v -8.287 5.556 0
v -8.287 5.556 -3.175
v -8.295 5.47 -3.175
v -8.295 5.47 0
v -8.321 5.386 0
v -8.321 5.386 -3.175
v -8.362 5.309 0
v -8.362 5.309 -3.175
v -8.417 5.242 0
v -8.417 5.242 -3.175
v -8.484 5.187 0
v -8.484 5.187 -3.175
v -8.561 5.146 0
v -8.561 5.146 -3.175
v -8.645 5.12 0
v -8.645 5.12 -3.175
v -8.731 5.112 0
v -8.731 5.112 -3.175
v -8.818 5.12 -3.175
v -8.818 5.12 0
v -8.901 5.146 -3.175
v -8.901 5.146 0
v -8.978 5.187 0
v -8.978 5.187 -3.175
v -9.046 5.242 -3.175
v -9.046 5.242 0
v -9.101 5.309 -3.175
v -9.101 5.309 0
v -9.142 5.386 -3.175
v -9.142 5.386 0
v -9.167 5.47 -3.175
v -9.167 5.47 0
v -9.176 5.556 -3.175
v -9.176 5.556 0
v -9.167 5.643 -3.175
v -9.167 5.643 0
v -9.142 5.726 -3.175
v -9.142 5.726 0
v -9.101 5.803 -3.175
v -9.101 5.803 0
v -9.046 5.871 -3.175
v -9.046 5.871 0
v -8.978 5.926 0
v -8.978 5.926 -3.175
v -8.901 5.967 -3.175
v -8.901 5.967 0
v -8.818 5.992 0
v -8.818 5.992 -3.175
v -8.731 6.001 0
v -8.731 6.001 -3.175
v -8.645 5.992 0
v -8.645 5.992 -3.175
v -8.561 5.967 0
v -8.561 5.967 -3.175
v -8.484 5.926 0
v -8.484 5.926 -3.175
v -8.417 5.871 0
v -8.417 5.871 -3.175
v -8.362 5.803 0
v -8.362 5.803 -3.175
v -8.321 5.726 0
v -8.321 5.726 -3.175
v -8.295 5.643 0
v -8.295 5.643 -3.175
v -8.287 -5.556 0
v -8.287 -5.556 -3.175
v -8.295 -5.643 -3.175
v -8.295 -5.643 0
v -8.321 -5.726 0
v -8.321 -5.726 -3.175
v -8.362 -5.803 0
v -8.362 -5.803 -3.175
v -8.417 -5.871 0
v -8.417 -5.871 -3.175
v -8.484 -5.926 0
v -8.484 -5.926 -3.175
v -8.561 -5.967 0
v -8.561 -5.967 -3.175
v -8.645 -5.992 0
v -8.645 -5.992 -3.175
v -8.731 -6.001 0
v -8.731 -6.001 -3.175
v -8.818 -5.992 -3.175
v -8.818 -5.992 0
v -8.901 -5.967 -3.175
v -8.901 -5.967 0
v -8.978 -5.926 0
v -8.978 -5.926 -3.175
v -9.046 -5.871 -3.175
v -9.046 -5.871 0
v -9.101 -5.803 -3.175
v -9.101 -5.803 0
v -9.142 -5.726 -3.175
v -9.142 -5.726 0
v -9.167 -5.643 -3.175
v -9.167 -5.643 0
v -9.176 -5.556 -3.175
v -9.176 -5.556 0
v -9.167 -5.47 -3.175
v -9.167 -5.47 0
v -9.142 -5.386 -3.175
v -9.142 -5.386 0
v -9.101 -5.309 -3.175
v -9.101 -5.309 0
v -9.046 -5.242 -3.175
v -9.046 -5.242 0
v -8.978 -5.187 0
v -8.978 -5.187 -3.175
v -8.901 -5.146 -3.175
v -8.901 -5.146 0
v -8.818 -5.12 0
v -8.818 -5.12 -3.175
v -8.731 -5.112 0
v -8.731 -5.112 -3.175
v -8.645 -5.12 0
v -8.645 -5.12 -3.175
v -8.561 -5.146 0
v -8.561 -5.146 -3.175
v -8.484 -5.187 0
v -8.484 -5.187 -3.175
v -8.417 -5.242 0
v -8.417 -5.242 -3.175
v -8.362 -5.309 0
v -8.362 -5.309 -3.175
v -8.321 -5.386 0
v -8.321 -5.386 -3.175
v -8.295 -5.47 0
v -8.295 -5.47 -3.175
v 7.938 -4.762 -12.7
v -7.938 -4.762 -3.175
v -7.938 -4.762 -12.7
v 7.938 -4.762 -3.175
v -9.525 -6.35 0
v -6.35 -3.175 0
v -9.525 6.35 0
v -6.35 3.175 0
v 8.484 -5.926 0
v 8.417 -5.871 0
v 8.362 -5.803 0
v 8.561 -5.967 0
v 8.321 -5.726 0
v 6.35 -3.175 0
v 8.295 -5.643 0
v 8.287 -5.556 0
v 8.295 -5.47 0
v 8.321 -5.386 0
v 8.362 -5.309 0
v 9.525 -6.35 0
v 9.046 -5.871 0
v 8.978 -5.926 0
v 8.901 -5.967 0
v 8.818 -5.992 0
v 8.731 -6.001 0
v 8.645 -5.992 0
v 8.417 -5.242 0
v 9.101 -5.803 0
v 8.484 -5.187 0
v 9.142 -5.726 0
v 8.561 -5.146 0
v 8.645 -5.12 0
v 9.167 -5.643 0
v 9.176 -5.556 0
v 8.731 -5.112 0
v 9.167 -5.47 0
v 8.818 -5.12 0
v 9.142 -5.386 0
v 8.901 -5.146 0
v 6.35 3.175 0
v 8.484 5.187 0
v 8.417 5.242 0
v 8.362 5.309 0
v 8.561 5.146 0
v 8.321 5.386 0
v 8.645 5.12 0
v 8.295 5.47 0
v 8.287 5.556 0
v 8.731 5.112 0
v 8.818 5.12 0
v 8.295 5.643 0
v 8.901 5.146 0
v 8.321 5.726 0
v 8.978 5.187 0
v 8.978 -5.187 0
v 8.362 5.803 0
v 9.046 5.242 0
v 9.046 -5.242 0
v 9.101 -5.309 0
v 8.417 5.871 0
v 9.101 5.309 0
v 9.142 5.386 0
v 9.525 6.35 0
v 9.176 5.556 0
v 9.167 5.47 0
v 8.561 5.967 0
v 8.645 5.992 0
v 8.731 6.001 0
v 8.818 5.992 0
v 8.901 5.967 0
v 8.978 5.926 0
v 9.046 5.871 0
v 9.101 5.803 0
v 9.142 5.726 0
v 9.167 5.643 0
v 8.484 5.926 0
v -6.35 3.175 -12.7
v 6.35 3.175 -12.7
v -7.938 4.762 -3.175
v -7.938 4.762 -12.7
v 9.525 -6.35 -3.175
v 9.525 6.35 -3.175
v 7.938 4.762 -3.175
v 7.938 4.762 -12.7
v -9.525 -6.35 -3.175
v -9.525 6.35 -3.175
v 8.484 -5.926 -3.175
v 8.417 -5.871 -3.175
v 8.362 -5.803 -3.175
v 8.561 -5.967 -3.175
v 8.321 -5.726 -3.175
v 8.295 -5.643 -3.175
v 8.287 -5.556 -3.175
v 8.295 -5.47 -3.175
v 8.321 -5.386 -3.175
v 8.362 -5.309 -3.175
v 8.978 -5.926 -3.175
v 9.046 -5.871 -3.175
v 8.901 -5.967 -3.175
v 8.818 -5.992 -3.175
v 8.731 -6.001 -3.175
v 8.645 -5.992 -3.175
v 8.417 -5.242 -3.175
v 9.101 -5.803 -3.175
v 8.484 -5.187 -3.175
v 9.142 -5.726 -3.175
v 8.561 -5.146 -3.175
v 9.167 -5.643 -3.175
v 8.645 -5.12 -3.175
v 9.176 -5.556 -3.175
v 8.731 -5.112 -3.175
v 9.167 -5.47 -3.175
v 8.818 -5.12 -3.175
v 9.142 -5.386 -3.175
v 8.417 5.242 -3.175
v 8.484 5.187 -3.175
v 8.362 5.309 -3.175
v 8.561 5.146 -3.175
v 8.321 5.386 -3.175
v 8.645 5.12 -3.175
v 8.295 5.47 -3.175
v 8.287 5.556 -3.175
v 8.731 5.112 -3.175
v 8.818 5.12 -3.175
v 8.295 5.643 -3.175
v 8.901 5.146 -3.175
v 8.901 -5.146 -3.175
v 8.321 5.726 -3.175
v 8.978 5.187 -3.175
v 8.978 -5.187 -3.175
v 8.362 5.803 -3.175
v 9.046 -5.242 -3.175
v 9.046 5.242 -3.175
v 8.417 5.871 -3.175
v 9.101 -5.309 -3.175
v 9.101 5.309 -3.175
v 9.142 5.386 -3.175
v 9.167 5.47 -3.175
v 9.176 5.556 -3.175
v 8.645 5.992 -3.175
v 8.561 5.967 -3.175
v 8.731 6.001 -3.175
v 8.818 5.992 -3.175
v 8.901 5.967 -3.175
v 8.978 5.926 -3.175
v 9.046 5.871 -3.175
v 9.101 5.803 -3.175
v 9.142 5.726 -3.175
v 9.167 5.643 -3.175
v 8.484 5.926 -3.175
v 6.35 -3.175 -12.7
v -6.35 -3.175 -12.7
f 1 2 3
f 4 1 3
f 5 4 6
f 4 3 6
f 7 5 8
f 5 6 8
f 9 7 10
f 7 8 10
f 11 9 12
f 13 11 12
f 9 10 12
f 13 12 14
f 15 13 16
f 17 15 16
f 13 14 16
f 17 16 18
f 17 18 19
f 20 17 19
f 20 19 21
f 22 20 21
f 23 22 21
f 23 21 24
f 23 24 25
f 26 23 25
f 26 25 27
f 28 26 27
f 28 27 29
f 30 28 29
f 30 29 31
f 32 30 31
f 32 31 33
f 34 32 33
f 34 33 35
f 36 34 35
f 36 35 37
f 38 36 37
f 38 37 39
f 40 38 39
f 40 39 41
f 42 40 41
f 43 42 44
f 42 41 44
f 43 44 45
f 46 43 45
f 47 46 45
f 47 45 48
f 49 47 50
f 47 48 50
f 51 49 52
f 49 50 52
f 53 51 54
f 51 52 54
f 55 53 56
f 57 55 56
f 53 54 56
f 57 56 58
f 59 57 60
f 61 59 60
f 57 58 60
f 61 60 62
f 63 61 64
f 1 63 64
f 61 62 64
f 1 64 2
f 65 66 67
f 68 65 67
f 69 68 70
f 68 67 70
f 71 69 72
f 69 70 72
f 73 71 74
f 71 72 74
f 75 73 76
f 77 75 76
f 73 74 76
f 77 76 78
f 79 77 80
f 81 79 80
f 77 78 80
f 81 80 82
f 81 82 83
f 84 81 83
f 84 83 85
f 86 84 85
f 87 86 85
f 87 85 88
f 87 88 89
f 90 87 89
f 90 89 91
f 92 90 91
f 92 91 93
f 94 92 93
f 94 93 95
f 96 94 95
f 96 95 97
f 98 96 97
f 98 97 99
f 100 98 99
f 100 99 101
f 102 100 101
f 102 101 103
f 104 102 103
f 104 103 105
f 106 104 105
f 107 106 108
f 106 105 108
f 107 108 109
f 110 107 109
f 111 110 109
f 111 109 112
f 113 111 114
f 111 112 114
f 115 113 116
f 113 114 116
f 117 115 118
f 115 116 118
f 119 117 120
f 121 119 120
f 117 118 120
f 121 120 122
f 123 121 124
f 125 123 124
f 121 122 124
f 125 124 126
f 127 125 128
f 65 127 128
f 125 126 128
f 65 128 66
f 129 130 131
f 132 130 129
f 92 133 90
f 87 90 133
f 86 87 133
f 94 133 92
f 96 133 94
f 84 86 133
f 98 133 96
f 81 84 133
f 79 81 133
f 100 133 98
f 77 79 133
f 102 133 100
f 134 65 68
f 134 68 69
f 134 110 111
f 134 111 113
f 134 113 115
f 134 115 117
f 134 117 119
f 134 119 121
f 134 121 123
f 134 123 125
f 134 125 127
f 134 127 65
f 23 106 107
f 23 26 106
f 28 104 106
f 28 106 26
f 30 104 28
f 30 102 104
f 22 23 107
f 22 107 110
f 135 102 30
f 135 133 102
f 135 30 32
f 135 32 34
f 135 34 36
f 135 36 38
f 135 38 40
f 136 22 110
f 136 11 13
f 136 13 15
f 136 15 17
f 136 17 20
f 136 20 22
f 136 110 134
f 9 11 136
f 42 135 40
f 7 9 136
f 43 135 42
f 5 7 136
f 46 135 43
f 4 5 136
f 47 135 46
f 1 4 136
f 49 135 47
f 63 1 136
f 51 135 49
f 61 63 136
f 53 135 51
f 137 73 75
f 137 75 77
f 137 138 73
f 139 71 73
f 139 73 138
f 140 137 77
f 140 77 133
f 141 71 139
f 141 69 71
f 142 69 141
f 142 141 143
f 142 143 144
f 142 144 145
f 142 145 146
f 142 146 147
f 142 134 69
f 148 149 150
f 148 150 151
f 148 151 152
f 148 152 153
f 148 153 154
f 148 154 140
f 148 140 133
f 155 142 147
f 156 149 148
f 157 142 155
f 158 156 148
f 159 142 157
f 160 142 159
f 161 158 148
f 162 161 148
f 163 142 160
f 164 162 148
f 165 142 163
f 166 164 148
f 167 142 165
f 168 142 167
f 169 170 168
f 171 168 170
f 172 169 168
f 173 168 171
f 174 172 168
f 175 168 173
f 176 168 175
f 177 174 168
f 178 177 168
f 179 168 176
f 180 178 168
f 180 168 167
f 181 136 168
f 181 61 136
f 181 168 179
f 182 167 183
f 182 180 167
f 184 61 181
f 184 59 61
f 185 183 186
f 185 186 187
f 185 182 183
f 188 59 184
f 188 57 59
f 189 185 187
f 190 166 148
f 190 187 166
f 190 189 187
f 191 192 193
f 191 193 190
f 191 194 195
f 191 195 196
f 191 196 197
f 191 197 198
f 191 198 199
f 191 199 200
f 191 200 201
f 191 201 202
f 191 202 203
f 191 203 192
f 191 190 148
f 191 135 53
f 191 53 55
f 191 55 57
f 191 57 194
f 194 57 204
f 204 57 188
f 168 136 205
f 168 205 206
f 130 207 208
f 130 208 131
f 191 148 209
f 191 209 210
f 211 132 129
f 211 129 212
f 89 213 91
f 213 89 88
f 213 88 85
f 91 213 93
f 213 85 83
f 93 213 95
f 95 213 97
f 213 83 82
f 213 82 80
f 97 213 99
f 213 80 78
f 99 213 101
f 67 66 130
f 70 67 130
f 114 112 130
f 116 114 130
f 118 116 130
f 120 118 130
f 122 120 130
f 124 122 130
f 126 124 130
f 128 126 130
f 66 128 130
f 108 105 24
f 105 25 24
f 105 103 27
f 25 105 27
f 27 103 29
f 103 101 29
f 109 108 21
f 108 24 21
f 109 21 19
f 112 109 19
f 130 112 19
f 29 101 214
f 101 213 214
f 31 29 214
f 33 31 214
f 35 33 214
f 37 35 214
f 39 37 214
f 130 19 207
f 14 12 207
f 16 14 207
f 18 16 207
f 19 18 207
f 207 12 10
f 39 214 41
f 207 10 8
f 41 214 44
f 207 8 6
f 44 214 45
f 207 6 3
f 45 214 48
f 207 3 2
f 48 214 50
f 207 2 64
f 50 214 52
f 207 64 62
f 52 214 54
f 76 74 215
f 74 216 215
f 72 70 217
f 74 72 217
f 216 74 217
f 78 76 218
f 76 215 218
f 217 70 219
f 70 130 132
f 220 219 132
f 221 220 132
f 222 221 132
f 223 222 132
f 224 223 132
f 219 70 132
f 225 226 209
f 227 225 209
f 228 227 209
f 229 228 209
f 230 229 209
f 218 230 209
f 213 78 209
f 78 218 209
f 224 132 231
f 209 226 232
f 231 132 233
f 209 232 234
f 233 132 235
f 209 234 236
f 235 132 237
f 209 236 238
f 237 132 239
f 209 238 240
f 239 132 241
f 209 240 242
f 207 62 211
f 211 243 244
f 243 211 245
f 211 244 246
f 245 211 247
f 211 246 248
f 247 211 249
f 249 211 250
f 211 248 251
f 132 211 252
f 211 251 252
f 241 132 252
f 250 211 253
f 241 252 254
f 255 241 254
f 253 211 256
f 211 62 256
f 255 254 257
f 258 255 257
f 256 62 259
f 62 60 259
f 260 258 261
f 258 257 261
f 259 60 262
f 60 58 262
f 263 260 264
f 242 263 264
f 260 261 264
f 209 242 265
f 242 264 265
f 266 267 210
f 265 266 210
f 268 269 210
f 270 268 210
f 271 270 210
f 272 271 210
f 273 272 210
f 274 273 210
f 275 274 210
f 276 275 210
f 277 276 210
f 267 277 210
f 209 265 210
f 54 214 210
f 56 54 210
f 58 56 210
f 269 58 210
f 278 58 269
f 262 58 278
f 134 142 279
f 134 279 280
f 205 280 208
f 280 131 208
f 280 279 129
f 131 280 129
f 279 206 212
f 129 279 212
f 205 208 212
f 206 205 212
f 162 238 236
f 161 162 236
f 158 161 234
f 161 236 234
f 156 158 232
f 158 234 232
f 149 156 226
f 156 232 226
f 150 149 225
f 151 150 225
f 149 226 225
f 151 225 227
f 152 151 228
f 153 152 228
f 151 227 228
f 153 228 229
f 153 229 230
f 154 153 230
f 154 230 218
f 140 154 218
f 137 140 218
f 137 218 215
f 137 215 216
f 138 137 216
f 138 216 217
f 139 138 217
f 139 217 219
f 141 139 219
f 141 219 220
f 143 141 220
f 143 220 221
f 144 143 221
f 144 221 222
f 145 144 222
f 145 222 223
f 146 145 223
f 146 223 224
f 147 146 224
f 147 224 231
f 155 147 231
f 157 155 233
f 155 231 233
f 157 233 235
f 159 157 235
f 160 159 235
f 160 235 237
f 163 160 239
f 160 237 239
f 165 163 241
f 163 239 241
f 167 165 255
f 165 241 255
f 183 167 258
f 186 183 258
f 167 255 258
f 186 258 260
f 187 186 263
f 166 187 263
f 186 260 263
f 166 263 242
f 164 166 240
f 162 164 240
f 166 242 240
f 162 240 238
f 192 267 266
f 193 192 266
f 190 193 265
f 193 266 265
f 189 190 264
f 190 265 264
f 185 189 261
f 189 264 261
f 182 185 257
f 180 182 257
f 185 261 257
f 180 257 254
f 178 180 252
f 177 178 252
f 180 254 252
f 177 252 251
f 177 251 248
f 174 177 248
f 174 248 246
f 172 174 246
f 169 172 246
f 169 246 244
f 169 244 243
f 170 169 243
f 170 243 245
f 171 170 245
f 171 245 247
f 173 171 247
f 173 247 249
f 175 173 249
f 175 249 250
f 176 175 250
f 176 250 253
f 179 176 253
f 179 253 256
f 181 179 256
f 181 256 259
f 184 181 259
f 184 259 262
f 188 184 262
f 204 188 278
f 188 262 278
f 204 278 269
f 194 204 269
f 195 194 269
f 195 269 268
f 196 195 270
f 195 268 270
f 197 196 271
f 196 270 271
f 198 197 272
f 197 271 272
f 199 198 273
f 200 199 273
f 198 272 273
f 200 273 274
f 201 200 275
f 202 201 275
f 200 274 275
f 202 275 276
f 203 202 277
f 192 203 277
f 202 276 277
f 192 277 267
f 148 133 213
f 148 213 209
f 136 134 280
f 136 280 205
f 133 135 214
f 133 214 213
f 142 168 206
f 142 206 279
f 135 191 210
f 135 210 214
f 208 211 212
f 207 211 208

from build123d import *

# Parameters (mm, degrees)
F1_DEPTH = 3.175
F2_DEPTH = 12.7
F3_R     = 0.4445
F4_DEPTH = 25.4


with BuildPart() as f1:
    # F0 (on Top) → F1 (new body)
    with BuildSketch(Plane.XY):
        Polygon((-7.9375, 4.7625), (0, 4.7625), (0, 6.35), (-9.525, 6.35), (-9.525, -6.35), (-7.9375, -4.7625), align=None)
        Polygon((0, 6.35), (0, 4.7625), (7.9375, 4.7625), (7.9375, -4.7625), (0, -4.7625), (0, -6.35), (9.525, -6.35), (9.525, 6.35), align=None)
        Polygon((0, -6.35), (0, -4.7625), (-7.9375, -4.7625), (-9.525, -6.35), align=None)
        Polygon((0, -4.7625), (0, -3.175), (-6.35, -3.175), (-7.9375, -4.7625), align=None)
        Polygon((-6.35, 3.175), (0, 3.175), (0, 4.7625), (-7.9375, 4.7625), (-7.9375, -4.7625), (-6.35, -3.175), align=None)
        Polygon((0, 3.175), (6.35, 3.175), (6.35, -3.175), (0, -3.175), (0, -4.7625), (7.9375, -4.7625), (7.9375, 4.7625), (0, 4.7625), align=None)
    extrude(amount=-F1_DEPTH)

    # F0 (on Top) → F2 (join)
    with BuildSketch(Plane.XY):
        Polygon((0, -4.7625), (0, -3.175), (-6.35, -3.175), (-7.9375, -4.7625), align=None)
        Polygon((0, 3.175), (6.35, 3.175), (6.35, -3.175), (0, -3.175), (0, -4.7625), (7.9375, -4.7625), (7.9375, 4.7625), (0, 4.7625), align=None)
        Polygon((-6.35, 3.175), (0, 3.175), (0, 4.7625), (-7.9375, 4.7625), (-7.9375, -4.7625), (-6.35, -3.175), align=None)
    extrude(amount=-F2_DEPTH)

    # F3 (on face) → F4 (cut)
    with BuildSketch(Plane(origin=(0, 0, -3.175), x_dir=(1, 0, 0), z_dir=(0, 0, -1))):
        with Locations((-8.73125, 5.55625)):
            Circle(F3_R)
        with Locations((8.73125, 5.55625)):
            Circle(F3_R)
        with Locations((8.73125, -5.55625)):
            Circle(F3_R)
        with Locations((-8.73125, -5.55625)):
            Circle(F3_R)
    extrude(amount=-F4_DEPTH, mode=Mode.SUBTRACT)


solid = f1.part
